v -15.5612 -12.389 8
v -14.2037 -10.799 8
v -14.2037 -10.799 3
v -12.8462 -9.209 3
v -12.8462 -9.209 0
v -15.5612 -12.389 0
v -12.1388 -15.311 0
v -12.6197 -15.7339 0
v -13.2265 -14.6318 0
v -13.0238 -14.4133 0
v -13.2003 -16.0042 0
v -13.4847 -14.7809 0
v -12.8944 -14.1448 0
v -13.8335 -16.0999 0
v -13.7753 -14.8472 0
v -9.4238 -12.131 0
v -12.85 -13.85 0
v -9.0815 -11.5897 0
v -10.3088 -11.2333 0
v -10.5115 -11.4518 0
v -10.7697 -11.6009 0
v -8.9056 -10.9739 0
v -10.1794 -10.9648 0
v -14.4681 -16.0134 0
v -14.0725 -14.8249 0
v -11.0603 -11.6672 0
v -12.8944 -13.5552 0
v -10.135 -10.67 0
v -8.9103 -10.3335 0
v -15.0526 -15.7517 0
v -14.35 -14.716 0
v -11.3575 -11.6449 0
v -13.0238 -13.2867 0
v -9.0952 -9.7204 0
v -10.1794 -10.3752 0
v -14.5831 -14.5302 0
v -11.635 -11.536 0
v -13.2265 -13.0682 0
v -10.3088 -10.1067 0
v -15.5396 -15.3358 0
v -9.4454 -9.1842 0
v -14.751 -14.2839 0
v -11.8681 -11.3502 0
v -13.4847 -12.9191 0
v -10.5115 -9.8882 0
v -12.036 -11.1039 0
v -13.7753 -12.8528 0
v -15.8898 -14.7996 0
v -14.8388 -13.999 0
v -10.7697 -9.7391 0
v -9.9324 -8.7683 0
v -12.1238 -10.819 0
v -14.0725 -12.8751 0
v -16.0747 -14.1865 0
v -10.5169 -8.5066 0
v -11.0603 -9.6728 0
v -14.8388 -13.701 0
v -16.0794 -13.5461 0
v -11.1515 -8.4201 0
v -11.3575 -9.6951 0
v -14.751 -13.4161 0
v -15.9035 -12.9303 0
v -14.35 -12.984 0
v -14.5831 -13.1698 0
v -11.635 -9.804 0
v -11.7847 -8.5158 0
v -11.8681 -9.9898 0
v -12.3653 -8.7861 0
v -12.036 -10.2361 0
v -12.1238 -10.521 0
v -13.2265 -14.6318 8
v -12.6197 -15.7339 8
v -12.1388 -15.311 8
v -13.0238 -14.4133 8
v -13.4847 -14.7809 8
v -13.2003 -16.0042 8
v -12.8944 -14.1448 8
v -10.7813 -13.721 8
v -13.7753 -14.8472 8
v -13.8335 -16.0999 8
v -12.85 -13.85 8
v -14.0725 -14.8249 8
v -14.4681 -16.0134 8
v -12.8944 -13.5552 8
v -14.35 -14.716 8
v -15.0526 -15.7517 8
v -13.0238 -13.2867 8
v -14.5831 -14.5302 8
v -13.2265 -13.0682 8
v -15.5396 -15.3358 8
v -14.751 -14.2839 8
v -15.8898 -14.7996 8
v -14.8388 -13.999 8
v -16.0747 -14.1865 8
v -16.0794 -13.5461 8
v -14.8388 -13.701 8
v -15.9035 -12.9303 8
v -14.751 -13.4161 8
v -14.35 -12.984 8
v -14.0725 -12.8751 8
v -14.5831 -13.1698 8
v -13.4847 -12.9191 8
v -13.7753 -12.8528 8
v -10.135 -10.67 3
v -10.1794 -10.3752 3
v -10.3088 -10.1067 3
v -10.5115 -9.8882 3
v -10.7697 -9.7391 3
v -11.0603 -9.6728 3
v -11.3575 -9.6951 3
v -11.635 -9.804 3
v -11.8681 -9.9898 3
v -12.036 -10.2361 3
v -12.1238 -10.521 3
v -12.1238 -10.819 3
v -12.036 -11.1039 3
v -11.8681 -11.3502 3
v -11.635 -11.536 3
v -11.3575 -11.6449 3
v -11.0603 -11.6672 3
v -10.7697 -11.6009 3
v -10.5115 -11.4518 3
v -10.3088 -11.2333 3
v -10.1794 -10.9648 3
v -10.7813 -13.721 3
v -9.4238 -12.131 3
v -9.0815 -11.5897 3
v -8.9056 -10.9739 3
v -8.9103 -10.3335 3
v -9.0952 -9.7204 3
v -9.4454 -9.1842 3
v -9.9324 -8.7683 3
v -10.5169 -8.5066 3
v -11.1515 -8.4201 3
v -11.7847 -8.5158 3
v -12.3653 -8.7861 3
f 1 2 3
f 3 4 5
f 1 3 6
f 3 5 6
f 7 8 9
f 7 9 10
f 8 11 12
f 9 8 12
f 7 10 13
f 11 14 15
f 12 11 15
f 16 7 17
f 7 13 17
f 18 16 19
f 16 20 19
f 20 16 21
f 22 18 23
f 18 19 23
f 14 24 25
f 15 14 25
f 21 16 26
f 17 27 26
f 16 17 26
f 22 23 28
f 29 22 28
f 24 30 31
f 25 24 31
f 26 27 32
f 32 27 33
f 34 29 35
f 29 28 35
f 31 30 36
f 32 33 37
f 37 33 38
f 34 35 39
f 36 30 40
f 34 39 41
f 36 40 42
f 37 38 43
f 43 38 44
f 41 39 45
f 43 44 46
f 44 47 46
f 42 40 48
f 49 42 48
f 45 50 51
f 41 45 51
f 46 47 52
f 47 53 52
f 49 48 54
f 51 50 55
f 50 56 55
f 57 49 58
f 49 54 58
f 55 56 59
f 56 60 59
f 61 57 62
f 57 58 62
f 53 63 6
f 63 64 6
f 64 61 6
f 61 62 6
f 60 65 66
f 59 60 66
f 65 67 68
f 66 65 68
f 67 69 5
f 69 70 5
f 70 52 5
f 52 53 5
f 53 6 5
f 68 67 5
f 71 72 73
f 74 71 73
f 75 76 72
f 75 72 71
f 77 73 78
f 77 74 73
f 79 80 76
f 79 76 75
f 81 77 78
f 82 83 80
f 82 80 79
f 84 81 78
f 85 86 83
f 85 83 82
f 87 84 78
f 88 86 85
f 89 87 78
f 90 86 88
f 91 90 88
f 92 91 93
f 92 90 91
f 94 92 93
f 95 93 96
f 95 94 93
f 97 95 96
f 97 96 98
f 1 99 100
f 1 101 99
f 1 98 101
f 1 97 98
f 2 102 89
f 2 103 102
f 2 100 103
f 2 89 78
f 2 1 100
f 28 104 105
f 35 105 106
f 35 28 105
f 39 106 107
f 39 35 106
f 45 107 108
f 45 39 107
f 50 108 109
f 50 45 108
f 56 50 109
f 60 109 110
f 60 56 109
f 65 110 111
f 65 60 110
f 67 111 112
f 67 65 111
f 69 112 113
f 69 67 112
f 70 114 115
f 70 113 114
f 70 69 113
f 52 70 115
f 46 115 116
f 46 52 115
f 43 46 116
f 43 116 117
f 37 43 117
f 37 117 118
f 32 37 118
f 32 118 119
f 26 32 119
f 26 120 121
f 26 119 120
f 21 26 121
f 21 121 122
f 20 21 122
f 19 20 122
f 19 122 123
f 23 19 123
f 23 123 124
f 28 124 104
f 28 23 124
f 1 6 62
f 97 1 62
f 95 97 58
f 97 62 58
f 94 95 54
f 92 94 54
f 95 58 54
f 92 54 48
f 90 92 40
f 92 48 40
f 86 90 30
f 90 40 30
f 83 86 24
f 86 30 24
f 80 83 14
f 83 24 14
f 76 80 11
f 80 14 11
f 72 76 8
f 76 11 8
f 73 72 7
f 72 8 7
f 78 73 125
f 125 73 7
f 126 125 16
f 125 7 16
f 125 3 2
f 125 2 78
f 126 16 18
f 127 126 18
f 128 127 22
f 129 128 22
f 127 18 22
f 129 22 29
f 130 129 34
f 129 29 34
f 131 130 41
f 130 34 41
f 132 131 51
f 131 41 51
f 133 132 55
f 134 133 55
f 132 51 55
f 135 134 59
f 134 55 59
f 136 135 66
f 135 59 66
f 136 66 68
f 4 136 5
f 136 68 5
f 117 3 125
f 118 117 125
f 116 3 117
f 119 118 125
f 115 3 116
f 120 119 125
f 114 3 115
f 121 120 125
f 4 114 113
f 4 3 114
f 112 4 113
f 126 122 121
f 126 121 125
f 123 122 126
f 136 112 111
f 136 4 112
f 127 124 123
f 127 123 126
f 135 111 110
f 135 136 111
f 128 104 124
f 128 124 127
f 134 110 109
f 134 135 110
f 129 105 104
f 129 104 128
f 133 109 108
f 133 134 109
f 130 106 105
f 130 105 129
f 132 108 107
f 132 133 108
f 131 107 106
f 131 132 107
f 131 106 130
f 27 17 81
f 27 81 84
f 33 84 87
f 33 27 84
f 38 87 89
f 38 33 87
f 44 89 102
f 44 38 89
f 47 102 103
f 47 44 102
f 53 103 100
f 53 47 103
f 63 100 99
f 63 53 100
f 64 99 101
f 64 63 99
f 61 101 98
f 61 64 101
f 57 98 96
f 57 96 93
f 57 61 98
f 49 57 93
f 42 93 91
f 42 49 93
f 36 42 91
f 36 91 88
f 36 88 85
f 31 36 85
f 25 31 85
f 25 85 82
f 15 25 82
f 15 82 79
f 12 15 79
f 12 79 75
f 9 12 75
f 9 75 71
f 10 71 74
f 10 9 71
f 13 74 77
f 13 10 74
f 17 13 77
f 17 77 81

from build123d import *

# Parameters (mm, degrees)
SKETCH3_R           = 1
BOSS_EXTRUDE1_DEPTH = 8
CUT_EXTRUDE1_START  = -5
CUT_EXTRUDE1_DEPTH  = 5


with BuildPart() as part:
    # Sketch3 → Boss-Extrude1 (new body)
    with BuildSketch(Plane(origin=(0, 0, 0), x_dir=(0, 1, 0), z_dir=(0, 0, 1))):
        with BuildLine():
            Line((-9.209045769, 12.846172912), (-12.389045769, 15.561172912))
            ThreePointArc((-12.389045769, 15.561172912), (-15.561172912, 15.310954231), (-15.310954231, 12.138827088))
            Line((-15.310954231, 12.138827088), (-12.130954231, 9.423827088))
            ThreePointArc((-12.130954231, 9.423827088), (-8.958827088, 9.674045769), (-9.209045769, 12.846172912))
        make_face()
        with Locations(Location((-13.85, 13.85, 0), (0, 0, 270))):
            Circle(SKETCH3_R, mode=Mode.SUBTRACT)
        with Locations(Location((-10.67, 11.135, 0), (0, 0, 270))):
            Circle(SKETCH3_R, mode=Mode.SUBTRACT)
    extrude(amount=BOSS_EXTRUDE1_DEPTH)

    # Sketch4 → Cut-Extrude1 (cut)
    with BuildSketch(Plane.XY.offset(8).offset(CUT_EXTRUDE1_START)):
        with BuildLine():
            Line((-12.846172912, -9.209045769), (-14.203672912, -10.799045769))
            Line((-14.203672912, -10.799045769), (-10.781327088, -13.720954231))
            Line((-10.781327088, -13.720954231), (-9.423827088, -12.130954231))
            ThreePointArc((-9.423827088, -12.130954231), (-9.674045769, -8.958827088), (-12.846172912, -9.209045769))
        make_face()
    extrude(amount=CUT_EXTRUDE1_DEPTH, mode=Mode.SUBTRACT)


solid = part.part
